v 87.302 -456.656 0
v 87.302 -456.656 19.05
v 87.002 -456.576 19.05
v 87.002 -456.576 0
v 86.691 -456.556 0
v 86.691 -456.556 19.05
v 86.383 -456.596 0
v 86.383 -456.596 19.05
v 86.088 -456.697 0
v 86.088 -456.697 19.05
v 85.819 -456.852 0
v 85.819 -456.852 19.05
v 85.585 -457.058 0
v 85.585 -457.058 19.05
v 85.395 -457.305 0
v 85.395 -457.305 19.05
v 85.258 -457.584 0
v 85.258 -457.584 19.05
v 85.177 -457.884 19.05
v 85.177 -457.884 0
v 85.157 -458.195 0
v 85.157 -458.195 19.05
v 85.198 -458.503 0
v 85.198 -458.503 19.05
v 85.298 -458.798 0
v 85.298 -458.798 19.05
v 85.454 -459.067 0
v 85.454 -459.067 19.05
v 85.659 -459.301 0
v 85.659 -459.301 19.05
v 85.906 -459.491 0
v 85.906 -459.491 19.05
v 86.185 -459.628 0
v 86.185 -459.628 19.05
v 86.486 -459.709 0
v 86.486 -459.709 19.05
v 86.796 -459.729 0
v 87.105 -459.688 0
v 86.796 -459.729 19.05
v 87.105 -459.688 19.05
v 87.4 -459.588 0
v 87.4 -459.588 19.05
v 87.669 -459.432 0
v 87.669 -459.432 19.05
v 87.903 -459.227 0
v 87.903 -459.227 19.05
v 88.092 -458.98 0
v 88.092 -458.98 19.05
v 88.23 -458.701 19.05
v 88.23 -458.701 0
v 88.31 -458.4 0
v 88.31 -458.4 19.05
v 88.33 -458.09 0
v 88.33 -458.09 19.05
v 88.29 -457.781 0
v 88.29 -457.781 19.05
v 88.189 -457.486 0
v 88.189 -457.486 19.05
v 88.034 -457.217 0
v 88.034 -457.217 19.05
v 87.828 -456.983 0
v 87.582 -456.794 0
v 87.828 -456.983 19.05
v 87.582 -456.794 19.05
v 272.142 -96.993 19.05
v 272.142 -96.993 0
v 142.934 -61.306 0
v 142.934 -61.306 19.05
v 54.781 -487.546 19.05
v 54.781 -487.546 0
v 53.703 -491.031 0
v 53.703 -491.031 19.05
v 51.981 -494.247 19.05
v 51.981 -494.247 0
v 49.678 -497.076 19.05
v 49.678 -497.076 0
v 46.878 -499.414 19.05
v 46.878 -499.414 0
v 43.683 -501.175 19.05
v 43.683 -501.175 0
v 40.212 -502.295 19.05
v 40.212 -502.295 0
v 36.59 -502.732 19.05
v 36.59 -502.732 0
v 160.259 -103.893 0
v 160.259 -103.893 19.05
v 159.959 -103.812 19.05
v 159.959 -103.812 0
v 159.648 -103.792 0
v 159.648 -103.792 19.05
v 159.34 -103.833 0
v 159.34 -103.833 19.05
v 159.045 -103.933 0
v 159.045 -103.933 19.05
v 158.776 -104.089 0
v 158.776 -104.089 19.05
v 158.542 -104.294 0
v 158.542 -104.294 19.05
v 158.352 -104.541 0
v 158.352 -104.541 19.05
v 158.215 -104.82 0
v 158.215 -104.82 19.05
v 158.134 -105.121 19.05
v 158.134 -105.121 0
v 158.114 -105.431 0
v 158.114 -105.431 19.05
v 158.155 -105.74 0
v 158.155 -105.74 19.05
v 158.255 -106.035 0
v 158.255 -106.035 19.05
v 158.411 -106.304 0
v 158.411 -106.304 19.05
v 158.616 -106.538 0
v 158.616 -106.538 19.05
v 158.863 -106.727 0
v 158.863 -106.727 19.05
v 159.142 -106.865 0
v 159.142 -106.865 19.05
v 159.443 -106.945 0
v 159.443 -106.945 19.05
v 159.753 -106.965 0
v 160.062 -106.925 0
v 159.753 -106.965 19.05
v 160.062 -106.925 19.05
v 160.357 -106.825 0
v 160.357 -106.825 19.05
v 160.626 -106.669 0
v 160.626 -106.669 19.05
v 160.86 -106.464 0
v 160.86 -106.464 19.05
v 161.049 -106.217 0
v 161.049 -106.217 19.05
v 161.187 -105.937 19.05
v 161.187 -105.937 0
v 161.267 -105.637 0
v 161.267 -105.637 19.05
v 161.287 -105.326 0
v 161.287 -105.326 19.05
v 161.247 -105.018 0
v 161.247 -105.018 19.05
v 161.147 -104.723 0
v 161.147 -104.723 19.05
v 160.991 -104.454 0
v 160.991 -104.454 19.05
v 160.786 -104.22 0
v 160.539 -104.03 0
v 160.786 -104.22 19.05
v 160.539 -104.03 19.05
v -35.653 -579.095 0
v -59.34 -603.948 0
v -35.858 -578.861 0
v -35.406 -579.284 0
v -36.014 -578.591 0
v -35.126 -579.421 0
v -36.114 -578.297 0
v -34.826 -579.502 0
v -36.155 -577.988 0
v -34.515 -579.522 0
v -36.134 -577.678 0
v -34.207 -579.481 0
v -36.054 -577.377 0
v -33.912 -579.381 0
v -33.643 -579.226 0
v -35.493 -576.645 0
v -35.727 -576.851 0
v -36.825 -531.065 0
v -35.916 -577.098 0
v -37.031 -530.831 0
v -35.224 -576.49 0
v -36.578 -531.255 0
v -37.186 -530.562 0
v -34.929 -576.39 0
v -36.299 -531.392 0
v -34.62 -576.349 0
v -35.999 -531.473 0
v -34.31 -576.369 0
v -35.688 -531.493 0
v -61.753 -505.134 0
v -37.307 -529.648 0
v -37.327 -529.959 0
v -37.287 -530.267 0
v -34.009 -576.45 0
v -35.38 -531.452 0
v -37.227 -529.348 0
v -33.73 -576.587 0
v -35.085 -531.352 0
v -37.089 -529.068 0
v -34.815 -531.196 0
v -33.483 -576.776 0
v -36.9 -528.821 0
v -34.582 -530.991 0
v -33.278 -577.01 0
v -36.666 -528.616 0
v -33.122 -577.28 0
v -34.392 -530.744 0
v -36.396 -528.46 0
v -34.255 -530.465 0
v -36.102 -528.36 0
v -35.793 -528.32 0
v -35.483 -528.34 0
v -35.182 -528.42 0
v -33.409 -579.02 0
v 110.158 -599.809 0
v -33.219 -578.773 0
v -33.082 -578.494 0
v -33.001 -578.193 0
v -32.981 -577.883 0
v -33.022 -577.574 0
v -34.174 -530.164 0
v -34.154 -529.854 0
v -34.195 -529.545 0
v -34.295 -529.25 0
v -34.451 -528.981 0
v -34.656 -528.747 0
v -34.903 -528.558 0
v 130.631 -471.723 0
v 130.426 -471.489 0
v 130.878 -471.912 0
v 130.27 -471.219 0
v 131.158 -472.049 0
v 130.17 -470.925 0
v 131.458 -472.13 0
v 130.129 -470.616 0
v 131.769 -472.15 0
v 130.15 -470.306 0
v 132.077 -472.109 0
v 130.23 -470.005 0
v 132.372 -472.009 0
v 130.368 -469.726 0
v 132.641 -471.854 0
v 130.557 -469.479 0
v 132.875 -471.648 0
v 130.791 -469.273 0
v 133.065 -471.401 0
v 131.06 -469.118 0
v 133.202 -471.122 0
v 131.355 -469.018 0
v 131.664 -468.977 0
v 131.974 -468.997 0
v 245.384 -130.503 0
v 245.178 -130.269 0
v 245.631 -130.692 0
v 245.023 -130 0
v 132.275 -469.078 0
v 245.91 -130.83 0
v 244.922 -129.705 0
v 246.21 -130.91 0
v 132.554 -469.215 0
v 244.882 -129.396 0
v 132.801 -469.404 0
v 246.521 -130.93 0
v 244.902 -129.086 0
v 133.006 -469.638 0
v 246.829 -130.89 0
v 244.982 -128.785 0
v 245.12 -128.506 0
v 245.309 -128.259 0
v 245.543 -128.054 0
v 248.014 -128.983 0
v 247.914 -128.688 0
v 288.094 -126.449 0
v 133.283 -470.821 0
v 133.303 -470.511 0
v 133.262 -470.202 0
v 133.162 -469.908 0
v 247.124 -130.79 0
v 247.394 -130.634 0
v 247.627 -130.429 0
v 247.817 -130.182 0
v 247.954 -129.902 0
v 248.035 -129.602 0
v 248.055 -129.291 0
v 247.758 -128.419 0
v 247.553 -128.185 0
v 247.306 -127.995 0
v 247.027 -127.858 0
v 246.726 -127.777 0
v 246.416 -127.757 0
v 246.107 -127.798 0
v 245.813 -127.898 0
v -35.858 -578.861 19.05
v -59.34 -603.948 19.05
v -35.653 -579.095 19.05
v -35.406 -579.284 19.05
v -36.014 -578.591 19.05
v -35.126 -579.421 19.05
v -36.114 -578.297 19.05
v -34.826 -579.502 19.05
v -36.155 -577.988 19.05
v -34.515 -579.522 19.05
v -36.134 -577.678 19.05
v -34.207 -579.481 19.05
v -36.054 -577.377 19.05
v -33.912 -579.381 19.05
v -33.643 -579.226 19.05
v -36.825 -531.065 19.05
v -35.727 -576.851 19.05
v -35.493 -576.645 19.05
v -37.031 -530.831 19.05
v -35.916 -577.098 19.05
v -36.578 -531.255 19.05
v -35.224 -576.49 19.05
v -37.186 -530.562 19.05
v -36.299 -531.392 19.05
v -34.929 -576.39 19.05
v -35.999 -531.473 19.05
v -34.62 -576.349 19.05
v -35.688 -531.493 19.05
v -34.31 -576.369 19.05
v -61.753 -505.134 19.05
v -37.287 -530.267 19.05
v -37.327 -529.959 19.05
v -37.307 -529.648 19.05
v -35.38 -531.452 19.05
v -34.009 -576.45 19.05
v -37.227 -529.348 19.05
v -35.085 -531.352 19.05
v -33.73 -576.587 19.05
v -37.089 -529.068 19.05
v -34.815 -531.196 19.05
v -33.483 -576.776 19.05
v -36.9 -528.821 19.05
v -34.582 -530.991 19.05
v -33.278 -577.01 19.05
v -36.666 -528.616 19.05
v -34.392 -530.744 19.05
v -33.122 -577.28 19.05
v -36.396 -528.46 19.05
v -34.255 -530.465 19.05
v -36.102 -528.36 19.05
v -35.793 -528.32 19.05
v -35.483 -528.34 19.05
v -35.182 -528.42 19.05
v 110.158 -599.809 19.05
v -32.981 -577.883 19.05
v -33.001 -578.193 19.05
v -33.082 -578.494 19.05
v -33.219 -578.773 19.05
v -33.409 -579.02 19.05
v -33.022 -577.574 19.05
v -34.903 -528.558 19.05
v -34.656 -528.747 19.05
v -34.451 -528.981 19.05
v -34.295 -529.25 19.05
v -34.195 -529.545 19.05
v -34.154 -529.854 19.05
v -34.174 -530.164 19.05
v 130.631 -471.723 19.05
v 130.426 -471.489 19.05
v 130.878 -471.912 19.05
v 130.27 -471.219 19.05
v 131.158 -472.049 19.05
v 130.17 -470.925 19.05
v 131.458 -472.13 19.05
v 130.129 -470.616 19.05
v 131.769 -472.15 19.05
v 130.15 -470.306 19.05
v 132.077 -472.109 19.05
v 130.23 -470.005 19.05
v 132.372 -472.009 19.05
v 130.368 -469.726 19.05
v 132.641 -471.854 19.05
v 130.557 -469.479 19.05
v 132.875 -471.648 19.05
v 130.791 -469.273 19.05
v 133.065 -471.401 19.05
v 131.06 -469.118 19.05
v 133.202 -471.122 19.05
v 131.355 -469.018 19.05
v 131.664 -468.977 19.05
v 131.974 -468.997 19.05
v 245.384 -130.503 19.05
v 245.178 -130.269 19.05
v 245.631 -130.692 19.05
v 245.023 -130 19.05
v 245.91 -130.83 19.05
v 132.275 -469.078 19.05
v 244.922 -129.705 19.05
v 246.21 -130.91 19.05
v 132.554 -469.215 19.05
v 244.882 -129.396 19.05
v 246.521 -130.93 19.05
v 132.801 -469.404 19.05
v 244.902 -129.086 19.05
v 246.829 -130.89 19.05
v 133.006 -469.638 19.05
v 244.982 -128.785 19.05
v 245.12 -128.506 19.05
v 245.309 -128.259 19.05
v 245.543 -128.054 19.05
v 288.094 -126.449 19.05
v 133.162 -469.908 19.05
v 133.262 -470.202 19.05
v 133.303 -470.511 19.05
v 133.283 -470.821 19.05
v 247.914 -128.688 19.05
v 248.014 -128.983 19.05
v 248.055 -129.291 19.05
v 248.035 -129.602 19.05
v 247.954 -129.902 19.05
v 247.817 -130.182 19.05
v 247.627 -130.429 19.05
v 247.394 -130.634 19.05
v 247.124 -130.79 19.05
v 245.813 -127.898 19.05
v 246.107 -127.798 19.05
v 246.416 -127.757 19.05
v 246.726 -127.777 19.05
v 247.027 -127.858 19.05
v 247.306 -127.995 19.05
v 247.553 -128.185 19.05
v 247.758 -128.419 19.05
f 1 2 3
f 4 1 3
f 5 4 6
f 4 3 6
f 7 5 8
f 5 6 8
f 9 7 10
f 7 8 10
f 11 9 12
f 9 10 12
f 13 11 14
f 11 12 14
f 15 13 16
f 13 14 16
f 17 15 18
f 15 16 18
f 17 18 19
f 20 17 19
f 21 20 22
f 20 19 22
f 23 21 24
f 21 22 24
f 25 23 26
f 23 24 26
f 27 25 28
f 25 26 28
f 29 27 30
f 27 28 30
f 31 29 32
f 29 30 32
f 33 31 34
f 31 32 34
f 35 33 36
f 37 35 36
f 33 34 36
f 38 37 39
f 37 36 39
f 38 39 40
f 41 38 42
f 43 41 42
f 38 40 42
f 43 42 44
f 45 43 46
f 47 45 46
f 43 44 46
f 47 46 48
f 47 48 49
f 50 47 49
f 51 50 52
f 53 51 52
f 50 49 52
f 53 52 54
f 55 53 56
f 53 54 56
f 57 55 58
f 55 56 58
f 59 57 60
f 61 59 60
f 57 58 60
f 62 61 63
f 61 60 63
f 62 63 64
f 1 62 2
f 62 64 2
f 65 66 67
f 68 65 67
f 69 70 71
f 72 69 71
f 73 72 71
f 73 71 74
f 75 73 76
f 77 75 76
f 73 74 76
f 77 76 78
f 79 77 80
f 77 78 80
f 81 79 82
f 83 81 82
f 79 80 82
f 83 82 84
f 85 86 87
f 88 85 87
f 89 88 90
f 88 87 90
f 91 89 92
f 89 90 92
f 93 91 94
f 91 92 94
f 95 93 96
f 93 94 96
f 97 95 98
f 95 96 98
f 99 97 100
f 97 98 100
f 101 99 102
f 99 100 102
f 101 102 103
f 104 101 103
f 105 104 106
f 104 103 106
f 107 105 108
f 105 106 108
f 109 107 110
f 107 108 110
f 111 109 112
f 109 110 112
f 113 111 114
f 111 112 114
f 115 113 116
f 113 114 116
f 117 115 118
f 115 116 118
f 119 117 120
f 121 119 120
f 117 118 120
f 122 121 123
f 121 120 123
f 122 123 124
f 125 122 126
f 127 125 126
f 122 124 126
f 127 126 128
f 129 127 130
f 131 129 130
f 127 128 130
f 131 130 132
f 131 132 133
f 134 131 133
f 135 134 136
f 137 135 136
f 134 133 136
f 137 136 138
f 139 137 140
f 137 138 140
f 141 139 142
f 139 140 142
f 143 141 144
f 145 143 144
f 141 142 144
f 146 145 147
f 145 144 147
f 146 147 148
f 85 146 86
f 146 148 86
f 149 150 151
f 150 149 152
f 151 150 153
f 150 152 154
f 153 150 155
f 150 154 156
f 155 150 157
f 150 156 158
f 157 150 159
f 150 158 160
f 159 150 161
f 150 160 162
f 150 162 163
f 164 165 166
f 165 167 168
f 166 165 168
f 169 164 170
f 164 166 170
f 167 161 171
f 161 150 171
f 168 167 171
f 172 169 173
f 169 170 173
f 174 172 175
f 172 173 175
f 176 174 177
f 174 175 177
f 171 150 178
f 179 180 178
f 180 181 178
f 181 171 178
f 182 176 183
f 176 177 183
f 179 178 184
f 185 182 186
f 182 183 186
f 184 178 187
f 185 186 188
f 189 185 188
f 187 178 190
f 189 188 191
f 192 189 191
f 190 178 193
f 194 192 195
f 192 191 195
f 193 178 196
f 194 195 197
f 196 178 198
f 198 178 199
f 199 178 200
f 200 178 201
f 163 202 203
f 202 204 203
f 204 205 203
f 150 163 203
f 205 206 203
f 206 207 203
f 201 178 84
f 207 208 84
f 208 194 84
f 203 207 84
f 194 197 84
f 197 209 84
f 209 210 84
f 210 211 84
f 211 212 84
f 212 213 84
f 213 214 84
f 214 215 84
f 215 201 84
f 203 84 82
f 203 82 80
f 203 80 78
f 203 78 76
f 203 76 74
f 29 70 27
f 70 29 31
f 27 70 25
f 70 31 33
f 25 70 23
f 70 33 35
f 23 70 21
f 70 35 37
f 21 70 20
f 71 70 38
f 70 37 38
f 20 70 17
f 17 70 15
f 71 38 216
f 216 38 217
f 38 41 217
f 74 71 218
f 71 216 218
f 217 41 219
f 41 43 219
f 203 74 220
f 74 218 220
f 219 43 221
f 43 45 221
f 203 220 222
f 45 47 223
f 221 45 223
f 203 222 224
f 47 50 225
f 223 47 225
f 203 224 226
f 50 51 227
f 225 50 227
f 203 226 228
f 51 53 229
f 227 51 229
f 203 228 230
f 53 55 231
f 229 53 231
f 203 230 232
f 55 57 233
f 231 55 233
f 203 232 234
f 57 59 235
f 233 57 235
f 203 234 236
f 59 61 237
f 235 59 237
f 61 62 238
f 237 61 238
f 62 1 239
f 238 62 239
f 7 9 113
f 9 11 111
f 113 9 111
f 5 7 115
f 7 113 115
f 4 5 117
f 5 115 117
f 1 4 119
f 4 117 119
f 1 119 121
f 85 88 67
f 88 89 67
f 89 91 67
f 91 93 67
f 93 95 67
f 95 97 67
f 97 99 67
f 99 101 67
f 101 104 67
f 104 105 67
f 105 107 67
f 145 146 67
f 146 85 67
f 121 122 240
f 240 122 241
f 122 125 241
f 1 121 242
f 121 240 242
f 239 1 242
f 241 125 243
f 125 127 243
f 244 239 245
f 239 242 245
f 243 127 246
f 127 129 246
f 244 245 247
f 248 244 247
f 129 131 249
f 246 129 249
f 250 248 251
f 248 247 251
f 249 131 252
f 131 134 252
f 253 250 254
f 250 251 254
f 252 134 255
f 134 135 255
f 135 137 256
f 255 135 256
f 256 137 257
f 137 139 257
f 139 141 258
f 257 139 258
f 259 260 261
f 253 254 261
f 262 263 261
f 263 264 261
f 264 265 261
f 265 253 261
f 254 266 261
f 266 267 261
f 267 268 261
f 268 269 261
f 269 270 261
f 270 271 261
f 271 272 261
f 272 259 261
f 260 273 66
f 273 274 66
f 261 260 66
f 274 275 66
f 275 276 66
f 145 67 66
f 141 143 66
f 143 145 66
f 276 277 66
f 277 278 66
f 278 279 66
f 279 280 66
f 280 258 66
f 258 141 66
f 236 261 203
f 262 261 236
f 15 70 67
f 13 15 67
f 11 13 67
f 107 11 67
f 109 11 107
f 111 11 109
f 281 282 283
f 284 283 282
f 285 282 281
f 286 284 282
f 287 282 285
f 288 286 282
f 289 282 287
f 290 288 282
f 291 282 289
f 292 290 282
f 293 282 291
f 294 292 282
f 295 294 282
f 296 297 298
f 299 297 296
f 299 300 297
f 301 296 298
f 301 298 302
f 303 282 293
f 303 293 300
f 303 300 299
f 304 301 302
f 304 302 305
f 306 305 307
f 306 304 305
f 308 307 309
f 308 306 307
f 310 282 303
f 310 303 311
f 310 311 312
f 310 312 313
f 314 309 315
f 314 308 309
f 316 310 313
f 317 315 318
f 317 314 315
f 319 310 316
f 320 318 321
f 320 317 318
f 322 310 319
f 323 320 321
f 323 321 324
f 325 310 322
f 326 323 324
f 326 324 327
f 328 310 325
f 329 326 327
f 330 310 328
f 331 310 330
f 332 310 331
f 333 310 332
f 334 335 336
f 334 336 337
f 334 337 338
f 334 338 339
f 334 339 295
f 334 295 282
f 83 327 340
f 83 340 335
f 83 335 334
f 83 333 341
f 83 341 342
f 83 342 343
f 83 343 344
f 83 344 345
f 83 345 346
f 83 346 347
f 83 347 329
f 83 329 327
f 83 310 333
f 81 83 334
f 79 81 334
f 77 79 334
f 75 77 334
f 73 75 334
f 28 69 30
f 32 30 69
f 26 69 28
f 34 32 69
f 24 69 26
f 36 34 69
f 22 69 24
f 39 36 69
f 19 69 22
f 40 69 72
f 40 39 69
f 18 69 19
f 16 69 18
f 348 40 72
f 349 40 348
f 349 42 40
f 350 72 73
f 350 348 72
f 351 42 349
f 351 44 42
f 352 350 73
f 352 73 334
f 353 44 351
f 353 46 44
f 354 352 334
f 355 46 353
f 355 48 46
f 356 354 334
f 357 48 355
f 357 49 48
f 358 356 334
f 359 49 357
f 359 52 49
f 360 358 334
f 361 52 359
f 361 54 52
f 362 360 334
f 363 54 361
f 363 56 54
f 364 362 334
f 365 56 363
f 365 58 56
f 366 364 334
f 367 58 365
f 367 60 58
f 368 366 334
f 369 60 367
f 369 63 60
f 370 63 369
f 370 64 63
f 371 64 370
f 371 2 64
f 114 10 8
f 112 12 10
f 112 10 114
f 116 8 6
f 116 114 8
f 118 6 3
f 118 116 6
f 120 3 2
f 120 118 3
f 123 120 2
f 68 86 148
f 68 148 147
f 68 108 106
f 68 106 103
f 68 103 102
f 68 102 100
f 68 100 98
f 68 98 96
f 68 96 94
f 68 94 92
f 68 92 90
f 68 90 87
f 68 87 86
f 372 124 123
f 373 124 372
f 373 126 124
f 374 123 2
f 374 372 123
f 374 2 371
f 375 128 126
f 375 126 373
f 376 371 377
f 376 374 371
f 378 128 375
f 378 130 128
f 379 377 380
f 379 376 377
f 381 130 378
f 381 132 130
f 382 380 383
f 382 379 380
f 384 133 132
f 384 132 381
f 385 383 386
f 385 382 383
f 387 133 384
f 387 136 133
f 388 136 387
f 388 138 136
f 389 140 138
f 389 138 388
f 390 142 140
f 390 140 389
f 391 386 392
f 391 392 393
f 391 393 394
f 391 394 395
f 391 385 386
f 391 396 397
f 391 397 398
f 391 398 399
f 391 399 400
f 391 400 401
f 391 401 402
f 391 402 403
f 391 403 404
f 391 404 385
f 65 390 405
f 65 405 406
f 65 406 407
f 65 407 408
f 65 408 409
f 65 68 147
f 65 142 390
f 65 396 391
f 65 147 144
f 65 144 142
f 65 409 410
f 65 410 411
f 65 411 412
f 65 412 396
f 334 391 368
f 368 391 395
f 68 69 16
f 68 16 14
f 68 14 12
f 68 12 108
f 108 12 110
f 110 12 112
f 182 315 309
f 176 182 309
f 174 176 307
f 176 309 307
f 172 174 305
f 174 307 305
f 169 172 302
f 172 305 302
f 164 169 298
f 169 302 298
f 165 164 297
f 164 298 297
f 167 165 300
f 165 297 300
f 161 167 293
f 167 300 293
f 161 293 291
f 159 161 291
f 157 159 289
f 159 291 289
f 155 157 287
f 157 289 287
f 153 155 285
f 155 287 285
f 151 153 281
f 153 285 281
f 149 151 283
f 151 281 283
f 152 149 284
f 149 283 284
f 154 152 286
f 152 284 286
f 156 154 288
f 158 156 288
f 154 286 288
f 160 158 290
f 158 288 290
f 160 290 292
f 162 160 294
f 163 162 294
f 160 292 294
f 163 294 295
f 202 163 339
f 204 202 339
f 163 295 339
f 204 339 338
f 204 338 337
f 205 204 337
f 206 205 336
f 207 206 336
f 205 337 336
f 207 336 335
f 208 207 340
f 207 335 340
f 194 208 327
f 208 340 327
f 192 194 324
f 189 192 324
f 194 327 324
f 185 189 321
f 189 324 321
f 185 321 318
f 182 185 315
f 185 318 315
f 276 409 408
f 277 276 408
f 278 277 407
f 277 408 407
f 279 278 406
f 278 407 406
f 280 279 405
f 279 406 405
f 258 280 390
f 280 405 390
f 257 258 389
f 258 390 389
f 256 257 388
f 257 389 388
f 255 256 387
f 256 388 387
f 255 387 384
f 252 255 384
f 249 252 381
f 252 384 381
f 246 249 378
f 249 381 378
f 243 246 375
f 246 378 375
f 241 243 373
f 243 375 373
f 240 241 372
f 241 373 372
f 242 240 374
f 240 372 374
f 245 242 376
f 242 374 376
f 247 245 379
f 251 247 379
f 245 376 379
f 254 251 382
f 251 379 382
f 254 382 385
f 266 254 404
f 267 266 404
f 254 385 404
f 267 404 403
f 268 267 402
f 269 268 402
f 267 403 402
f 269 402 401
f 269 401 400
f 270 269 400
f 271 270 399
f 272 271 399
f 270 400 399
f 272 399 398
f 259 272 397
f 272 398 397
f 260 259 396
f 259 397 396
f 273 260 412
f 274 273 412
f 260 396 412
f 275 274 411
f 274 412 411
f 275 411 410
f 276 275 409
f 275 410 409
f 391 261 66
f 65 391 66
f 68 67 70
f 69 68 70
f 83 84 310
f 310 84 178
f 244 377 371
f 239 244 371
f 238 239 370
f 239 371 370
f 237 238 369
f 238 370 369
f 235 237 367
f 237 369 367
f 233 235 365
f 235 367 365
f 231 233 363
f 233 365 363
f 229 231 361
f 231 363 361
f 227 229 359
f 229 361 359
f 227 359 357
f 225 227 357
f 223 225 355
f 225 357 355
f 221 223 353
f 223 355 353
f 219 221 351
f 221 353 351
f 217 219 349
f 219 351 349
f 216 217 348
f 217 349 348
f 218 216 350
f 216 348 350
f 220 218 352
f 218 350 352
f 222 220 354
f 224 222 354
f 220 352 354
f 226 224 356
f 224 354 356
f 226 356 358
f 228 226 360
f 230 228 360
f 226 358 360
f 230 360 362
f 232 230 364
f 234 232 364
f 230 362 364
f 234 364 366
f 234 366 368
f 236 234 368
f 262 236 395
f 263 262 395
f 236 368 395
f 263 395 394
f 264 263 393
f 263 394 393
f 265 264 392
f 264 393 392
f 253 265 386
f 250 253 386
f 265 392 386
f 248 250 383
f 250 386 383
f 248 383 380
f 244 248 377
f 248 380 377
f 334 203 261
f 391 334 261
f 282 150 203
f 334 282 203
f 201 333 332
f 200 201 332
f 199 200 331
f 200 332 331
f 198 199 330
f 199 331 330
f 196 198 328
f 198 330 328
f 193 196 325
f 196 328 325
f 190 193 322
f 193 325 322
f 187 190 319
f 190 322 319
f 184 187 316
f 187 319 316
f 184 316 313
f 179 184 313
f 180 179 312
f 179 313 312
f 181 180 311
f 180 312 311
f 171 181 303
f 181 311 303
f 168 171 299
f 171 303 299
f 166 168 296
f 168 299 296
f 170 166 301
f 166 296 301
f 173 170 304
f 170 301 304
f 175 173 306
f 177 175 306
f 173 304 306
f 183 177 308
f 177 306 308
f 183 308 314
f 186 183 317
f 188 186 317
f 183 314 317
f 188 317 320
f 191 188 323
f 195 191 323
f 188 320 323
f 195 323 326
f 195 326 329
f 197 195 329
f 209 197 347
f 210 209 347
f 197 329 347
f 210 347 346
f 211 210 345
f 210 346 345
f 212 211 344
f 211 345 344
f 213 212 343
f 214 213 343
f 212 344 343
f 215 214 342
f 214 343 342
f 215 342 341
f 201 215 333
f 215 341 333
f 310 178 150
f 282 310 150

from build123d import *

# Parameters (mm, degrees)
BOSS_EXTRUDE1_DEPTH = 19.05
HOLE3_D             = 3.175
HOLE3_DEPTH         = 38.1
HOLE3_CSINK_D       = 10.16
HOLE3_CSINK_ANGLE   = 82
HOLE3_TIP           = 0.953866233


with BuildPart() as part:
    # Sketch1 → Boss-Extrude1 (new body)
    with BuildSketch(Plane.XY):
        with BuildLine():
            Line((-61.753066592, -505.133747826), (-59.340316311, -603.947946941))
            Line((-59.340316311, -603.947946941), (110.157739028, -599.809306096))
            Line((110.157739028, -599.809306096), (288.094390135, -126.448741632))
            Line((288.094390135, -126.448741632), (272.141590142, -96.993017293))
            Line((272.141590142, -96.993017293), (142.933900932, -61.306223753))
            Line((142.933900932, -61.306223753), (54.780700044, -487.546357698))
            ThreePointArc((54.780700044, -487.546357698), (48.334106484, -498.311851218), (36.590496304, -502.732489089))
            Line((36.590496304, -502.732489089), (-61.753066592, -505.133747826))
        make_face()
    extrude(amount=BOSS_EXTRUDE1_DEPTH)

    # Hole3
    with Locations(Plane(origin=(295.820901284, -105.894091108, -19.05), x_dir=(-0.3518626346959965, -0.9360516472421764, 8.51430303154421e-15), z_dir=(0, 0, -1))):
        with Locations((47.413288654, 127.596711745), (39.315467427, 37.945520226), (403.288916316, 71.764018496), (399.091743996, 25.297013484), (513.561319184, 161.164706775), (558.106616554, 143.167238399), (571.189751829, 175.54913452), (654.969392627, 382.911022042), (526.644454459, 193.546602895), (610.424095257, 400.908490418)):
            CounterSinkHole(HOLE3_D / 2, HOLE3_CSINK_D / 2, depth=HOLE3_DEPTH, counter_sink_angle=HOLE3_CSINK_ANGLE)
            with Locations((0, 0, -(HOLE3_DEPTH + HOLE3_TIP / 2))):  # 118° drill point
                Cone(0, HOLE3_D / 2, HOLE3_TIP, mode=Mode.SUBTRACT)


solid = part.part
